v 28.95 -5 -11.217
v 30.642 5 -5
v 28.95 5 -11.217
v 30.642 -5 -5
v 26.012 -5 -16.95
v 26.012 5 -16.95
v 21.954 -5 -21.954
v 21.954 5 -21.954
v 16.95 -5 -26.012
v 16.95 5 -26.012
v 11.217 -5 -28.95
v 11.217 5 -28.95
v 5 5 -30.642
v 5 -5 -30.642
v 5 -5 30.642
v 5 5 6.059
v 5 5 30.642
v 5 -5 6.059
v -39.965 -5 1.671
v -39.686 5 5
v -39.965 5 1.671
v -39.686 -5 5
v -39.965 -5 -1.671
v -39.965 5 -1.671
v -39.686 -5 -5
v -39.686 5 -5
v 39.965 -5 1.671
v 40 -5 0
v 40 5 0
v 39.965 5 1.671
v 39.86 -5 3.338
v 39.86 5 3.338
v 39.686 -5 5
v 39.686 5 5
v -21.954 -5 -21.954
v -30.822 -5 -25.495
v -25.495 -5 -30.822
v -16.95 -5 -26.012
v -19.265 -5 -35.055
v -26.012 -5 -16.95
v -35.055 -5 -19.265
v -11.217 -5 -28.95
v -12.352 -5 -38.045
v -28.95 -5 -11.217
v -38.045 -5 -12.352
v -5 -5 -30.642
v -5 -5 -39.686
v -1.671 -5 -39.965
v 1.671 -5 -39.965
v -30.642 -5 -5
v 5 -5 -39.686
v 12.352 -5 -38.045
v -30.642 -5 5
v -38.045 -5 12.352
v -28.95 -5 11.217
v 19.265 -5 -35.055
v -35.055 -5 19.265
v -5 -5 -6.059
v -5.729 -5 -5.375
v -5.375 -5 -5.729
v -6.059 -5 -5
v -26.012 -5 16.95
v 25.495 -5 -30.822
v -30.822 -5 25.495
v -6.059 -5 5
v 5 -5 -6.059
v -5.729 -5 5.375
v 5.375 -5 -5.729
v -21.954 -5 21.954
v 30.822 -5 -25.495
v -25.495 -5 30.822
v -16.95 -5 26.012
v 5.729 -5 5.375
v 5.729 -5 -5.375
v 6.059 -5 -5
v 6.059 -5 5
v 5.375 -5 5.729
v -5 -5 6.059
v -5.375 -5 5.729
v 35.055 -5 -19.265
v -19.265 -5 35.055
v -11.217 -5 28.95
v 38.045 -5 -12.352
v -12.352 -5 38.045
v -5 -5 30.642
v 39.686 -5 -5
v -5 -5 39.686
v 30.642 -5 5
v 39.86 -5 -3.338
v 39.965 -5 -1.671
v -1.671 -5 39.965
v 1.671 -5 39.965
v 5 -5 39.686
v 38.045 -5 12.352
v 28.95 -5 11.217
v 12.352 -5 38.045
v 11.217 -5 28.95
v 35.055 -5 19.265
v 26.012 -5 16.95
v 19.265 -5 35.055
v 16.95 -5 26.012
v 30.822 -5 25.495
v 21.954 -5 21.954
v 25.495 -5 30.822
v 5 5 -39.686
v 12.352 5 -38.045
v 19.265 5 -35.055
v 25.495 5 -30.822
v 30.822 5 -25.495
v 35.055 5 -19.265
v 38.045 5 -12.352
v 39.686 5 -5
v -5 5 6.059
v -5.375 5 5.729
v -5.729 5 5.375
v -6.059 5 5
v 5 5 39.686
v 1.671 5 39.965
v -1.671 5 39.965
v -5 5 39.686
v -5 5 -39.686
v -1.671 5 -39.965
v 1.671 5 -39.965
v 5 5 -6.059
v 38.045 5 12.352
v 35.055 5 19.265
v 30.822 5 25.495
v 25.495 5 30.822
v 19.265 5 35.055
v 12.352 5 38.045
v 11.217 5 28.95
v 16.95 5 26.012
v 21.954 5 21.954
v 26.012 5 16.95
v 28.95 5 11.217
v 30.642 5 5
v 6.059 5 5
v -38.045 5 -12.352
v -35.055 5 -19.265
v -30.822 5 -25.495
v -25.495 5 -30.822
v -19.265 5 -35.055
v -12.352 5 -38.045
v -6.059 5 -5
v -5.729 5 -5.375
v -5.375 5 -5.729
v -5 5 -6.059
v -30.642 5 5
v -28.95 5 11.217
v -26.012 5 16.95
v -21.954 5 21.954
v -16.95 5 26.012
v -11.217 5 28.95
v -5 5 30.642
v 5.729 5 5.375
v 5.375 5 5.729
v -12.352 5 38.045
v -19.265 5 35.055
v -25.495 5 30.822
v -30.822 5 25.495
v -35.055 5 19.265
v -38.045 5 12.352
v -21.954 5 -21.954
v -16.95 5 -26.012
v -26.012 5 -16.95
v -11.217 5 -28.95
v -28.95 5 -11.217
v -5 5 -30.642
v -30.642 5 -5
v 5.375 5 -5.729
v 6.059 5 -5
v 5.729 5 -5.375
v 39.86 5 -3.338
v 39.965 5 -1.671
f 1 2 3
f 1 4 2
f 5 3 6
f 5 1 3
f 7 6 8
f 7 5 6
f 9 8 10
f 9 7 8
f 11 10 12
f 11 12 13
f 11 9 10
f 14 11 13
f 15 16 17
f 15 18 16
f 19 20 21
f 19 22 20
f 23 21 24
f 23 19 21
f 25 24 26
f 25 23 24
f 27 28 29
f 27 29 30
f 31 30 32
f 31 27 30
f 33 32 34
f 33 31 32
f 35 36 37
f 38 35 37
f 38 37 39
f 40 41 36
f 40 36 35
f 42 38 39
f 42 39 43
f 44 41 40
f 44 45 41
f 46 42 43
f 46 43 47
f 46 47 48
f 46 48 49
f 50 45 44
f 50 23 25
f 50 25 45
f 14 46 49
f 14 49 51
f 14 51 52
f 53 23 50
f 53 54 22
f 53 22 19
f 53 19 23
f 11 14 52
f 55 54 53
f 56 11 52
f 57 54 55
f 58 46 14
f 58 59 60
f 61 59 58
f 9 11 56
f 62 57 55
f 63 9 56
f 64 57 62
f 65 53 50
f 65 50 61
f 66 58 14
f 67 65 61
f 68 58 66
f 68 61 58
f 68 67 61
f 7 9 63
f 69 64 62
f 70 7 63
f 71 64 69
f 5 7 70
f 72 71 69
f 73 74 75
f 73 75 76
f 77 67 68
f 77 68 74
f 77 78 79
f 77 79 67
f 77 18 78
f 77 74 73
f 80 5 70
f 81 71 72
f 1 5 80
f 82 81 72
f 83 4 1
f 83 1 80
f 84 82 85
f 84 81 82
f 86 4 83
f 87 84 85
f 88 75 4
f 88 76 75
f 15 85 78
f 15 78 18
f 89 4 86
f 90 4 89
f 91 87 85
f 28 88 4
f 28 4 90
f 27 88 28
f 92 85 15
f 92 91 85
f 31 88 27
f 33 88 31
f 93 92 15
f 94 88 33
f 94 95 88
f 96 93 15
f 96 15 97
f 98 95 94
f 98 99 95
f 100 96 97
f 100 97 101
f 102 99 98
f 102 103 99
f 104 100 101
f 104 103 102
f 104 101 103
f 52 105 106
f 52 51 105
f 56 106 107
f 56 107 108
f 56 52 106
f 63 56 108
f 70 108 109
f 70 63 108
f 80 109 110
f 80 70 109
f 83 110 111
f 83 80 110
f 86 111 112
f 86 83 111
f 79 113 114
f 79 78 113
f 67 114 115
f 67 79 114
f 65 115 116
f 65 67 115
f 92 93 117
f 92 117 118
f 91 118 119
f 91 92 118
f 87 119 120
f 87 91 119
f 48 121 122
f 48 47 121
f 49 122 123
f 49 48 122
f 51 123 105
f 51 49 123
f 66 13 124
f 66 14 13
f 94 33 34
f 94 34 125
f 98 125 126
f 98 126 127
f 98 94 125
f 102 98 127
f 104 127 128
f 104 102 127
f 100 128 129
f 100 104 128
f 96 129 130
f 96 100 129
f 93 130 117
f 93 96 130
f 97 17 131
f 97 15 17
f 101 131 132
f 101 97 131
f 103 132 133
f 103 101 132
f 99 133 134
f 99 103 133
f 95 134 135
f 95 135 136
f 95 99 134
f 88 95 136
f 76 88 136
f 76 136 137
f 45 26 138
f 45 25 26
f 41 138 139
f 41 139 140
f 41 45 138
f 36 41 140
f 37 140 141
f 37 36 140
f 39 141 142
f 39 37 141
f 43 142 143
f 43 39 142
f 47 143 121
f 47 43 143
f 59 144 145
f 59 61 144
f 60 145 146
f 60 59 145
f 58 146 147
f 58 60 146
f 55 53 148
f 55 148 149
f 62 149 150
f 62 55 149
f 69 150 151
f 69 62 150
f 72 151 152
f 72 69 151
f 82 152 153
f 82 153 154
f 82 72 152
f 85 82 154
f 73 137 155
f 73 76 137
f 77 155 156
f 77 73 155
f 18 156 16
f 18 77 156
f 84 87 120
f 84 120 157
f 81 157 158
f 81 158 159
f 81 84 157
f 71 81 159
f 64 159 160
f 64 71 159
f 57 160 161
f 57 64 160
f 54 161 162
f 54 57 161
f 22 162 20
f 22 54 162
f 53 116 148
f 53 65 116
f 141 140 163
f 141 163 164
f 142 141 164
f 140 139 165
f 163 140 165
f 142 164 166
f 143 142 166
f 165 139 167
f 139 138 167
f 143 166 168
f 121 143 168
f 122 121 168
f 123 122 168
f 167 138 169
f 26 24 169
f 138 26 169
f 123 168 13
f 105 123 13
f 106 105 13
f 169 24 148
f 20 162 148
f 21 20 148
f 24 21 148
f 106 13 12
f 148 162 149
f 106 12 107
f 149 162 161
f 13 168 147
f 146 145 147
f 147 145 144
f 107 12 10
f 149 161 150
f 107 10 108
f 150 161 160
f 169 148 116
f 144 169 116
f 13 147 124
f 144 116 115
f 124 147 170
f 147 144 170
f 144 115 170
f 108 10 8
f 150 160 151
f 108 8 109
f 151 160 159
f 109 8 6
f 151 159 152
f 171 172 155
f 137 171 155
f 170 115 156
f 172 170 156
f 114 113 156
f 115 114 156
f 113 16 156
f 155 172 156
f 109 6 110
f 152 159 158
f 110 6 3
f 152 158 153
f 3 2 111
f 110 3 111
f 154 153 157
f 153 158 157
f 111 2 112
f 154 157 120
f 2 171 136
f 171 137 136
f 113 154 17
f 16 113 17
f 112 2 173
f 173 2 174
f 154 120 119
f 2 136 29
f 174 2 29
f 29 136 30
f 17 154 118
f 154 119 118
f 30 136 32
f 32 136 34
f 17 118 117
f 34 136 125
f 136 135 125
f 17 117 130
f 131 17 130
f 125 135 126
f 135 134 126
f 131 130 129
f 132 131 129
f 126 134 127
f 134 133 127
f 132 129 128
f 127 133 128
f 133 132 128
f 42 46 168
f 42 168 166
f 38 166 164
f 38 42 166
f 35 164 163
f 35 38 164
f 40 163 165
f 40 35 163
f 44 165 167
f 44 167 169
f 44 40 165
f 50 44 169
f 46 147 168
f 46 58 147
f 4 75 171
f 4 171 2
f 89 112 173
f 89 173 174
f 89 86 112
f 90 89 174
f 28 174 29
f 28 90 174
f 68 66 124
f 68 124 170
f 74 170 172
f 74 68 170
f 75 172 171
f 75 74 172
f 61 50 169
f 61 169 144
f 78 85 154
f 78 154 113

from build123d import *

# Parameters (mm, degrees)
F1_DEPTH = 5


with BuildPart() as f1:
    # F0 (on Front) → F1 (new body, symmetric)
    with BuildSketch(Plane.XZ):
        with BuildLine():
            ThreePointArc((39.68627, -5), (39.92149, -2.504917), (40, 0))
            ThreePointArc((40, 0), (39.92149, 2.504917), (39.68627, 5))
            ThreePointArc((39.68627, 5), (28.284271, 28.284271), (5, 39.68627))
            ThreePointArc((5, 39.68627), (0, 40), (-5, 39.68627))
            ThreePointArc((-5, 39.68627), (-28.284271, 28.284271), (-39.68627, 5))
            ThreePointArc((-39.68627, 5), (-40, 0), (-39.68627, -5))
            ThreePointArc((-39.68627, -5), (-28.284271, -28.284271), (-5, -39.68627))
            ThreePointArc((-5, -39.68627), (0, -40), (5, -39.68627))
            ThreePointArc((5, -39.68627), (28.284271, -28.284271), (39.68627, -5))
        make_face()
        with BuildLine():
            ThreePointArc((-5, -30.641942), (-21.953686, -21.953686), (-30.641942, -5))
            Line((-30.641942, -5), (-6.05909, -5))
            ThreePointArc((-6.05909, -5), (-5.554843, -5.554844), (-5, -6.05909))
            Line((-5, -6.05909), (-5, -30.641942))
        make_face(mode=Mode.SUBTRACT)
        with BuildLine():
            ThreePointArc((5, -6.05909), (5.554843, -5.554843), (6.05909, -5))
            Line((6.05909, -5), (30.641942, -5))
            ThreePointArc((30.641942, -5), (21.953686, -21.953686), (5, -30.641942))
            Line((5, -30.641942), (5, -6.05909))
        make_face(mode=Mode.SUBTRACT)
        with BuildLine():
            ThreePointArc((-30.641942, 5), (-21.953686, 21.953686), (-5, 30.641942))
            Line((-5, 30.641942), (-5, 6.05909))
            ThreePointArc((-5, 6.05909), (-5.554843, 5.554843), (-6.05909, 5))
            Line((-6.05909, 5), (-30.641942, 5))
        make_face(mode=Mode.SUBTRACT)
        with BuildLine():
            Line((30.641942, 5), (6.05909, 5))
            ThreePointArc((6.05909, 5), (5.554843, 5.554843), (5, 6.05909))
            Line((5, 6.05909), (5, 30.641942))
            ThreePointArc((5, 30.641942), (21.953686, 21.953686), (30.641942, 5))
        make_face(mode=Mode.SUBTRACT)
    extrude(amount=F1_DEPTH, both=True)


solid = f1.part
